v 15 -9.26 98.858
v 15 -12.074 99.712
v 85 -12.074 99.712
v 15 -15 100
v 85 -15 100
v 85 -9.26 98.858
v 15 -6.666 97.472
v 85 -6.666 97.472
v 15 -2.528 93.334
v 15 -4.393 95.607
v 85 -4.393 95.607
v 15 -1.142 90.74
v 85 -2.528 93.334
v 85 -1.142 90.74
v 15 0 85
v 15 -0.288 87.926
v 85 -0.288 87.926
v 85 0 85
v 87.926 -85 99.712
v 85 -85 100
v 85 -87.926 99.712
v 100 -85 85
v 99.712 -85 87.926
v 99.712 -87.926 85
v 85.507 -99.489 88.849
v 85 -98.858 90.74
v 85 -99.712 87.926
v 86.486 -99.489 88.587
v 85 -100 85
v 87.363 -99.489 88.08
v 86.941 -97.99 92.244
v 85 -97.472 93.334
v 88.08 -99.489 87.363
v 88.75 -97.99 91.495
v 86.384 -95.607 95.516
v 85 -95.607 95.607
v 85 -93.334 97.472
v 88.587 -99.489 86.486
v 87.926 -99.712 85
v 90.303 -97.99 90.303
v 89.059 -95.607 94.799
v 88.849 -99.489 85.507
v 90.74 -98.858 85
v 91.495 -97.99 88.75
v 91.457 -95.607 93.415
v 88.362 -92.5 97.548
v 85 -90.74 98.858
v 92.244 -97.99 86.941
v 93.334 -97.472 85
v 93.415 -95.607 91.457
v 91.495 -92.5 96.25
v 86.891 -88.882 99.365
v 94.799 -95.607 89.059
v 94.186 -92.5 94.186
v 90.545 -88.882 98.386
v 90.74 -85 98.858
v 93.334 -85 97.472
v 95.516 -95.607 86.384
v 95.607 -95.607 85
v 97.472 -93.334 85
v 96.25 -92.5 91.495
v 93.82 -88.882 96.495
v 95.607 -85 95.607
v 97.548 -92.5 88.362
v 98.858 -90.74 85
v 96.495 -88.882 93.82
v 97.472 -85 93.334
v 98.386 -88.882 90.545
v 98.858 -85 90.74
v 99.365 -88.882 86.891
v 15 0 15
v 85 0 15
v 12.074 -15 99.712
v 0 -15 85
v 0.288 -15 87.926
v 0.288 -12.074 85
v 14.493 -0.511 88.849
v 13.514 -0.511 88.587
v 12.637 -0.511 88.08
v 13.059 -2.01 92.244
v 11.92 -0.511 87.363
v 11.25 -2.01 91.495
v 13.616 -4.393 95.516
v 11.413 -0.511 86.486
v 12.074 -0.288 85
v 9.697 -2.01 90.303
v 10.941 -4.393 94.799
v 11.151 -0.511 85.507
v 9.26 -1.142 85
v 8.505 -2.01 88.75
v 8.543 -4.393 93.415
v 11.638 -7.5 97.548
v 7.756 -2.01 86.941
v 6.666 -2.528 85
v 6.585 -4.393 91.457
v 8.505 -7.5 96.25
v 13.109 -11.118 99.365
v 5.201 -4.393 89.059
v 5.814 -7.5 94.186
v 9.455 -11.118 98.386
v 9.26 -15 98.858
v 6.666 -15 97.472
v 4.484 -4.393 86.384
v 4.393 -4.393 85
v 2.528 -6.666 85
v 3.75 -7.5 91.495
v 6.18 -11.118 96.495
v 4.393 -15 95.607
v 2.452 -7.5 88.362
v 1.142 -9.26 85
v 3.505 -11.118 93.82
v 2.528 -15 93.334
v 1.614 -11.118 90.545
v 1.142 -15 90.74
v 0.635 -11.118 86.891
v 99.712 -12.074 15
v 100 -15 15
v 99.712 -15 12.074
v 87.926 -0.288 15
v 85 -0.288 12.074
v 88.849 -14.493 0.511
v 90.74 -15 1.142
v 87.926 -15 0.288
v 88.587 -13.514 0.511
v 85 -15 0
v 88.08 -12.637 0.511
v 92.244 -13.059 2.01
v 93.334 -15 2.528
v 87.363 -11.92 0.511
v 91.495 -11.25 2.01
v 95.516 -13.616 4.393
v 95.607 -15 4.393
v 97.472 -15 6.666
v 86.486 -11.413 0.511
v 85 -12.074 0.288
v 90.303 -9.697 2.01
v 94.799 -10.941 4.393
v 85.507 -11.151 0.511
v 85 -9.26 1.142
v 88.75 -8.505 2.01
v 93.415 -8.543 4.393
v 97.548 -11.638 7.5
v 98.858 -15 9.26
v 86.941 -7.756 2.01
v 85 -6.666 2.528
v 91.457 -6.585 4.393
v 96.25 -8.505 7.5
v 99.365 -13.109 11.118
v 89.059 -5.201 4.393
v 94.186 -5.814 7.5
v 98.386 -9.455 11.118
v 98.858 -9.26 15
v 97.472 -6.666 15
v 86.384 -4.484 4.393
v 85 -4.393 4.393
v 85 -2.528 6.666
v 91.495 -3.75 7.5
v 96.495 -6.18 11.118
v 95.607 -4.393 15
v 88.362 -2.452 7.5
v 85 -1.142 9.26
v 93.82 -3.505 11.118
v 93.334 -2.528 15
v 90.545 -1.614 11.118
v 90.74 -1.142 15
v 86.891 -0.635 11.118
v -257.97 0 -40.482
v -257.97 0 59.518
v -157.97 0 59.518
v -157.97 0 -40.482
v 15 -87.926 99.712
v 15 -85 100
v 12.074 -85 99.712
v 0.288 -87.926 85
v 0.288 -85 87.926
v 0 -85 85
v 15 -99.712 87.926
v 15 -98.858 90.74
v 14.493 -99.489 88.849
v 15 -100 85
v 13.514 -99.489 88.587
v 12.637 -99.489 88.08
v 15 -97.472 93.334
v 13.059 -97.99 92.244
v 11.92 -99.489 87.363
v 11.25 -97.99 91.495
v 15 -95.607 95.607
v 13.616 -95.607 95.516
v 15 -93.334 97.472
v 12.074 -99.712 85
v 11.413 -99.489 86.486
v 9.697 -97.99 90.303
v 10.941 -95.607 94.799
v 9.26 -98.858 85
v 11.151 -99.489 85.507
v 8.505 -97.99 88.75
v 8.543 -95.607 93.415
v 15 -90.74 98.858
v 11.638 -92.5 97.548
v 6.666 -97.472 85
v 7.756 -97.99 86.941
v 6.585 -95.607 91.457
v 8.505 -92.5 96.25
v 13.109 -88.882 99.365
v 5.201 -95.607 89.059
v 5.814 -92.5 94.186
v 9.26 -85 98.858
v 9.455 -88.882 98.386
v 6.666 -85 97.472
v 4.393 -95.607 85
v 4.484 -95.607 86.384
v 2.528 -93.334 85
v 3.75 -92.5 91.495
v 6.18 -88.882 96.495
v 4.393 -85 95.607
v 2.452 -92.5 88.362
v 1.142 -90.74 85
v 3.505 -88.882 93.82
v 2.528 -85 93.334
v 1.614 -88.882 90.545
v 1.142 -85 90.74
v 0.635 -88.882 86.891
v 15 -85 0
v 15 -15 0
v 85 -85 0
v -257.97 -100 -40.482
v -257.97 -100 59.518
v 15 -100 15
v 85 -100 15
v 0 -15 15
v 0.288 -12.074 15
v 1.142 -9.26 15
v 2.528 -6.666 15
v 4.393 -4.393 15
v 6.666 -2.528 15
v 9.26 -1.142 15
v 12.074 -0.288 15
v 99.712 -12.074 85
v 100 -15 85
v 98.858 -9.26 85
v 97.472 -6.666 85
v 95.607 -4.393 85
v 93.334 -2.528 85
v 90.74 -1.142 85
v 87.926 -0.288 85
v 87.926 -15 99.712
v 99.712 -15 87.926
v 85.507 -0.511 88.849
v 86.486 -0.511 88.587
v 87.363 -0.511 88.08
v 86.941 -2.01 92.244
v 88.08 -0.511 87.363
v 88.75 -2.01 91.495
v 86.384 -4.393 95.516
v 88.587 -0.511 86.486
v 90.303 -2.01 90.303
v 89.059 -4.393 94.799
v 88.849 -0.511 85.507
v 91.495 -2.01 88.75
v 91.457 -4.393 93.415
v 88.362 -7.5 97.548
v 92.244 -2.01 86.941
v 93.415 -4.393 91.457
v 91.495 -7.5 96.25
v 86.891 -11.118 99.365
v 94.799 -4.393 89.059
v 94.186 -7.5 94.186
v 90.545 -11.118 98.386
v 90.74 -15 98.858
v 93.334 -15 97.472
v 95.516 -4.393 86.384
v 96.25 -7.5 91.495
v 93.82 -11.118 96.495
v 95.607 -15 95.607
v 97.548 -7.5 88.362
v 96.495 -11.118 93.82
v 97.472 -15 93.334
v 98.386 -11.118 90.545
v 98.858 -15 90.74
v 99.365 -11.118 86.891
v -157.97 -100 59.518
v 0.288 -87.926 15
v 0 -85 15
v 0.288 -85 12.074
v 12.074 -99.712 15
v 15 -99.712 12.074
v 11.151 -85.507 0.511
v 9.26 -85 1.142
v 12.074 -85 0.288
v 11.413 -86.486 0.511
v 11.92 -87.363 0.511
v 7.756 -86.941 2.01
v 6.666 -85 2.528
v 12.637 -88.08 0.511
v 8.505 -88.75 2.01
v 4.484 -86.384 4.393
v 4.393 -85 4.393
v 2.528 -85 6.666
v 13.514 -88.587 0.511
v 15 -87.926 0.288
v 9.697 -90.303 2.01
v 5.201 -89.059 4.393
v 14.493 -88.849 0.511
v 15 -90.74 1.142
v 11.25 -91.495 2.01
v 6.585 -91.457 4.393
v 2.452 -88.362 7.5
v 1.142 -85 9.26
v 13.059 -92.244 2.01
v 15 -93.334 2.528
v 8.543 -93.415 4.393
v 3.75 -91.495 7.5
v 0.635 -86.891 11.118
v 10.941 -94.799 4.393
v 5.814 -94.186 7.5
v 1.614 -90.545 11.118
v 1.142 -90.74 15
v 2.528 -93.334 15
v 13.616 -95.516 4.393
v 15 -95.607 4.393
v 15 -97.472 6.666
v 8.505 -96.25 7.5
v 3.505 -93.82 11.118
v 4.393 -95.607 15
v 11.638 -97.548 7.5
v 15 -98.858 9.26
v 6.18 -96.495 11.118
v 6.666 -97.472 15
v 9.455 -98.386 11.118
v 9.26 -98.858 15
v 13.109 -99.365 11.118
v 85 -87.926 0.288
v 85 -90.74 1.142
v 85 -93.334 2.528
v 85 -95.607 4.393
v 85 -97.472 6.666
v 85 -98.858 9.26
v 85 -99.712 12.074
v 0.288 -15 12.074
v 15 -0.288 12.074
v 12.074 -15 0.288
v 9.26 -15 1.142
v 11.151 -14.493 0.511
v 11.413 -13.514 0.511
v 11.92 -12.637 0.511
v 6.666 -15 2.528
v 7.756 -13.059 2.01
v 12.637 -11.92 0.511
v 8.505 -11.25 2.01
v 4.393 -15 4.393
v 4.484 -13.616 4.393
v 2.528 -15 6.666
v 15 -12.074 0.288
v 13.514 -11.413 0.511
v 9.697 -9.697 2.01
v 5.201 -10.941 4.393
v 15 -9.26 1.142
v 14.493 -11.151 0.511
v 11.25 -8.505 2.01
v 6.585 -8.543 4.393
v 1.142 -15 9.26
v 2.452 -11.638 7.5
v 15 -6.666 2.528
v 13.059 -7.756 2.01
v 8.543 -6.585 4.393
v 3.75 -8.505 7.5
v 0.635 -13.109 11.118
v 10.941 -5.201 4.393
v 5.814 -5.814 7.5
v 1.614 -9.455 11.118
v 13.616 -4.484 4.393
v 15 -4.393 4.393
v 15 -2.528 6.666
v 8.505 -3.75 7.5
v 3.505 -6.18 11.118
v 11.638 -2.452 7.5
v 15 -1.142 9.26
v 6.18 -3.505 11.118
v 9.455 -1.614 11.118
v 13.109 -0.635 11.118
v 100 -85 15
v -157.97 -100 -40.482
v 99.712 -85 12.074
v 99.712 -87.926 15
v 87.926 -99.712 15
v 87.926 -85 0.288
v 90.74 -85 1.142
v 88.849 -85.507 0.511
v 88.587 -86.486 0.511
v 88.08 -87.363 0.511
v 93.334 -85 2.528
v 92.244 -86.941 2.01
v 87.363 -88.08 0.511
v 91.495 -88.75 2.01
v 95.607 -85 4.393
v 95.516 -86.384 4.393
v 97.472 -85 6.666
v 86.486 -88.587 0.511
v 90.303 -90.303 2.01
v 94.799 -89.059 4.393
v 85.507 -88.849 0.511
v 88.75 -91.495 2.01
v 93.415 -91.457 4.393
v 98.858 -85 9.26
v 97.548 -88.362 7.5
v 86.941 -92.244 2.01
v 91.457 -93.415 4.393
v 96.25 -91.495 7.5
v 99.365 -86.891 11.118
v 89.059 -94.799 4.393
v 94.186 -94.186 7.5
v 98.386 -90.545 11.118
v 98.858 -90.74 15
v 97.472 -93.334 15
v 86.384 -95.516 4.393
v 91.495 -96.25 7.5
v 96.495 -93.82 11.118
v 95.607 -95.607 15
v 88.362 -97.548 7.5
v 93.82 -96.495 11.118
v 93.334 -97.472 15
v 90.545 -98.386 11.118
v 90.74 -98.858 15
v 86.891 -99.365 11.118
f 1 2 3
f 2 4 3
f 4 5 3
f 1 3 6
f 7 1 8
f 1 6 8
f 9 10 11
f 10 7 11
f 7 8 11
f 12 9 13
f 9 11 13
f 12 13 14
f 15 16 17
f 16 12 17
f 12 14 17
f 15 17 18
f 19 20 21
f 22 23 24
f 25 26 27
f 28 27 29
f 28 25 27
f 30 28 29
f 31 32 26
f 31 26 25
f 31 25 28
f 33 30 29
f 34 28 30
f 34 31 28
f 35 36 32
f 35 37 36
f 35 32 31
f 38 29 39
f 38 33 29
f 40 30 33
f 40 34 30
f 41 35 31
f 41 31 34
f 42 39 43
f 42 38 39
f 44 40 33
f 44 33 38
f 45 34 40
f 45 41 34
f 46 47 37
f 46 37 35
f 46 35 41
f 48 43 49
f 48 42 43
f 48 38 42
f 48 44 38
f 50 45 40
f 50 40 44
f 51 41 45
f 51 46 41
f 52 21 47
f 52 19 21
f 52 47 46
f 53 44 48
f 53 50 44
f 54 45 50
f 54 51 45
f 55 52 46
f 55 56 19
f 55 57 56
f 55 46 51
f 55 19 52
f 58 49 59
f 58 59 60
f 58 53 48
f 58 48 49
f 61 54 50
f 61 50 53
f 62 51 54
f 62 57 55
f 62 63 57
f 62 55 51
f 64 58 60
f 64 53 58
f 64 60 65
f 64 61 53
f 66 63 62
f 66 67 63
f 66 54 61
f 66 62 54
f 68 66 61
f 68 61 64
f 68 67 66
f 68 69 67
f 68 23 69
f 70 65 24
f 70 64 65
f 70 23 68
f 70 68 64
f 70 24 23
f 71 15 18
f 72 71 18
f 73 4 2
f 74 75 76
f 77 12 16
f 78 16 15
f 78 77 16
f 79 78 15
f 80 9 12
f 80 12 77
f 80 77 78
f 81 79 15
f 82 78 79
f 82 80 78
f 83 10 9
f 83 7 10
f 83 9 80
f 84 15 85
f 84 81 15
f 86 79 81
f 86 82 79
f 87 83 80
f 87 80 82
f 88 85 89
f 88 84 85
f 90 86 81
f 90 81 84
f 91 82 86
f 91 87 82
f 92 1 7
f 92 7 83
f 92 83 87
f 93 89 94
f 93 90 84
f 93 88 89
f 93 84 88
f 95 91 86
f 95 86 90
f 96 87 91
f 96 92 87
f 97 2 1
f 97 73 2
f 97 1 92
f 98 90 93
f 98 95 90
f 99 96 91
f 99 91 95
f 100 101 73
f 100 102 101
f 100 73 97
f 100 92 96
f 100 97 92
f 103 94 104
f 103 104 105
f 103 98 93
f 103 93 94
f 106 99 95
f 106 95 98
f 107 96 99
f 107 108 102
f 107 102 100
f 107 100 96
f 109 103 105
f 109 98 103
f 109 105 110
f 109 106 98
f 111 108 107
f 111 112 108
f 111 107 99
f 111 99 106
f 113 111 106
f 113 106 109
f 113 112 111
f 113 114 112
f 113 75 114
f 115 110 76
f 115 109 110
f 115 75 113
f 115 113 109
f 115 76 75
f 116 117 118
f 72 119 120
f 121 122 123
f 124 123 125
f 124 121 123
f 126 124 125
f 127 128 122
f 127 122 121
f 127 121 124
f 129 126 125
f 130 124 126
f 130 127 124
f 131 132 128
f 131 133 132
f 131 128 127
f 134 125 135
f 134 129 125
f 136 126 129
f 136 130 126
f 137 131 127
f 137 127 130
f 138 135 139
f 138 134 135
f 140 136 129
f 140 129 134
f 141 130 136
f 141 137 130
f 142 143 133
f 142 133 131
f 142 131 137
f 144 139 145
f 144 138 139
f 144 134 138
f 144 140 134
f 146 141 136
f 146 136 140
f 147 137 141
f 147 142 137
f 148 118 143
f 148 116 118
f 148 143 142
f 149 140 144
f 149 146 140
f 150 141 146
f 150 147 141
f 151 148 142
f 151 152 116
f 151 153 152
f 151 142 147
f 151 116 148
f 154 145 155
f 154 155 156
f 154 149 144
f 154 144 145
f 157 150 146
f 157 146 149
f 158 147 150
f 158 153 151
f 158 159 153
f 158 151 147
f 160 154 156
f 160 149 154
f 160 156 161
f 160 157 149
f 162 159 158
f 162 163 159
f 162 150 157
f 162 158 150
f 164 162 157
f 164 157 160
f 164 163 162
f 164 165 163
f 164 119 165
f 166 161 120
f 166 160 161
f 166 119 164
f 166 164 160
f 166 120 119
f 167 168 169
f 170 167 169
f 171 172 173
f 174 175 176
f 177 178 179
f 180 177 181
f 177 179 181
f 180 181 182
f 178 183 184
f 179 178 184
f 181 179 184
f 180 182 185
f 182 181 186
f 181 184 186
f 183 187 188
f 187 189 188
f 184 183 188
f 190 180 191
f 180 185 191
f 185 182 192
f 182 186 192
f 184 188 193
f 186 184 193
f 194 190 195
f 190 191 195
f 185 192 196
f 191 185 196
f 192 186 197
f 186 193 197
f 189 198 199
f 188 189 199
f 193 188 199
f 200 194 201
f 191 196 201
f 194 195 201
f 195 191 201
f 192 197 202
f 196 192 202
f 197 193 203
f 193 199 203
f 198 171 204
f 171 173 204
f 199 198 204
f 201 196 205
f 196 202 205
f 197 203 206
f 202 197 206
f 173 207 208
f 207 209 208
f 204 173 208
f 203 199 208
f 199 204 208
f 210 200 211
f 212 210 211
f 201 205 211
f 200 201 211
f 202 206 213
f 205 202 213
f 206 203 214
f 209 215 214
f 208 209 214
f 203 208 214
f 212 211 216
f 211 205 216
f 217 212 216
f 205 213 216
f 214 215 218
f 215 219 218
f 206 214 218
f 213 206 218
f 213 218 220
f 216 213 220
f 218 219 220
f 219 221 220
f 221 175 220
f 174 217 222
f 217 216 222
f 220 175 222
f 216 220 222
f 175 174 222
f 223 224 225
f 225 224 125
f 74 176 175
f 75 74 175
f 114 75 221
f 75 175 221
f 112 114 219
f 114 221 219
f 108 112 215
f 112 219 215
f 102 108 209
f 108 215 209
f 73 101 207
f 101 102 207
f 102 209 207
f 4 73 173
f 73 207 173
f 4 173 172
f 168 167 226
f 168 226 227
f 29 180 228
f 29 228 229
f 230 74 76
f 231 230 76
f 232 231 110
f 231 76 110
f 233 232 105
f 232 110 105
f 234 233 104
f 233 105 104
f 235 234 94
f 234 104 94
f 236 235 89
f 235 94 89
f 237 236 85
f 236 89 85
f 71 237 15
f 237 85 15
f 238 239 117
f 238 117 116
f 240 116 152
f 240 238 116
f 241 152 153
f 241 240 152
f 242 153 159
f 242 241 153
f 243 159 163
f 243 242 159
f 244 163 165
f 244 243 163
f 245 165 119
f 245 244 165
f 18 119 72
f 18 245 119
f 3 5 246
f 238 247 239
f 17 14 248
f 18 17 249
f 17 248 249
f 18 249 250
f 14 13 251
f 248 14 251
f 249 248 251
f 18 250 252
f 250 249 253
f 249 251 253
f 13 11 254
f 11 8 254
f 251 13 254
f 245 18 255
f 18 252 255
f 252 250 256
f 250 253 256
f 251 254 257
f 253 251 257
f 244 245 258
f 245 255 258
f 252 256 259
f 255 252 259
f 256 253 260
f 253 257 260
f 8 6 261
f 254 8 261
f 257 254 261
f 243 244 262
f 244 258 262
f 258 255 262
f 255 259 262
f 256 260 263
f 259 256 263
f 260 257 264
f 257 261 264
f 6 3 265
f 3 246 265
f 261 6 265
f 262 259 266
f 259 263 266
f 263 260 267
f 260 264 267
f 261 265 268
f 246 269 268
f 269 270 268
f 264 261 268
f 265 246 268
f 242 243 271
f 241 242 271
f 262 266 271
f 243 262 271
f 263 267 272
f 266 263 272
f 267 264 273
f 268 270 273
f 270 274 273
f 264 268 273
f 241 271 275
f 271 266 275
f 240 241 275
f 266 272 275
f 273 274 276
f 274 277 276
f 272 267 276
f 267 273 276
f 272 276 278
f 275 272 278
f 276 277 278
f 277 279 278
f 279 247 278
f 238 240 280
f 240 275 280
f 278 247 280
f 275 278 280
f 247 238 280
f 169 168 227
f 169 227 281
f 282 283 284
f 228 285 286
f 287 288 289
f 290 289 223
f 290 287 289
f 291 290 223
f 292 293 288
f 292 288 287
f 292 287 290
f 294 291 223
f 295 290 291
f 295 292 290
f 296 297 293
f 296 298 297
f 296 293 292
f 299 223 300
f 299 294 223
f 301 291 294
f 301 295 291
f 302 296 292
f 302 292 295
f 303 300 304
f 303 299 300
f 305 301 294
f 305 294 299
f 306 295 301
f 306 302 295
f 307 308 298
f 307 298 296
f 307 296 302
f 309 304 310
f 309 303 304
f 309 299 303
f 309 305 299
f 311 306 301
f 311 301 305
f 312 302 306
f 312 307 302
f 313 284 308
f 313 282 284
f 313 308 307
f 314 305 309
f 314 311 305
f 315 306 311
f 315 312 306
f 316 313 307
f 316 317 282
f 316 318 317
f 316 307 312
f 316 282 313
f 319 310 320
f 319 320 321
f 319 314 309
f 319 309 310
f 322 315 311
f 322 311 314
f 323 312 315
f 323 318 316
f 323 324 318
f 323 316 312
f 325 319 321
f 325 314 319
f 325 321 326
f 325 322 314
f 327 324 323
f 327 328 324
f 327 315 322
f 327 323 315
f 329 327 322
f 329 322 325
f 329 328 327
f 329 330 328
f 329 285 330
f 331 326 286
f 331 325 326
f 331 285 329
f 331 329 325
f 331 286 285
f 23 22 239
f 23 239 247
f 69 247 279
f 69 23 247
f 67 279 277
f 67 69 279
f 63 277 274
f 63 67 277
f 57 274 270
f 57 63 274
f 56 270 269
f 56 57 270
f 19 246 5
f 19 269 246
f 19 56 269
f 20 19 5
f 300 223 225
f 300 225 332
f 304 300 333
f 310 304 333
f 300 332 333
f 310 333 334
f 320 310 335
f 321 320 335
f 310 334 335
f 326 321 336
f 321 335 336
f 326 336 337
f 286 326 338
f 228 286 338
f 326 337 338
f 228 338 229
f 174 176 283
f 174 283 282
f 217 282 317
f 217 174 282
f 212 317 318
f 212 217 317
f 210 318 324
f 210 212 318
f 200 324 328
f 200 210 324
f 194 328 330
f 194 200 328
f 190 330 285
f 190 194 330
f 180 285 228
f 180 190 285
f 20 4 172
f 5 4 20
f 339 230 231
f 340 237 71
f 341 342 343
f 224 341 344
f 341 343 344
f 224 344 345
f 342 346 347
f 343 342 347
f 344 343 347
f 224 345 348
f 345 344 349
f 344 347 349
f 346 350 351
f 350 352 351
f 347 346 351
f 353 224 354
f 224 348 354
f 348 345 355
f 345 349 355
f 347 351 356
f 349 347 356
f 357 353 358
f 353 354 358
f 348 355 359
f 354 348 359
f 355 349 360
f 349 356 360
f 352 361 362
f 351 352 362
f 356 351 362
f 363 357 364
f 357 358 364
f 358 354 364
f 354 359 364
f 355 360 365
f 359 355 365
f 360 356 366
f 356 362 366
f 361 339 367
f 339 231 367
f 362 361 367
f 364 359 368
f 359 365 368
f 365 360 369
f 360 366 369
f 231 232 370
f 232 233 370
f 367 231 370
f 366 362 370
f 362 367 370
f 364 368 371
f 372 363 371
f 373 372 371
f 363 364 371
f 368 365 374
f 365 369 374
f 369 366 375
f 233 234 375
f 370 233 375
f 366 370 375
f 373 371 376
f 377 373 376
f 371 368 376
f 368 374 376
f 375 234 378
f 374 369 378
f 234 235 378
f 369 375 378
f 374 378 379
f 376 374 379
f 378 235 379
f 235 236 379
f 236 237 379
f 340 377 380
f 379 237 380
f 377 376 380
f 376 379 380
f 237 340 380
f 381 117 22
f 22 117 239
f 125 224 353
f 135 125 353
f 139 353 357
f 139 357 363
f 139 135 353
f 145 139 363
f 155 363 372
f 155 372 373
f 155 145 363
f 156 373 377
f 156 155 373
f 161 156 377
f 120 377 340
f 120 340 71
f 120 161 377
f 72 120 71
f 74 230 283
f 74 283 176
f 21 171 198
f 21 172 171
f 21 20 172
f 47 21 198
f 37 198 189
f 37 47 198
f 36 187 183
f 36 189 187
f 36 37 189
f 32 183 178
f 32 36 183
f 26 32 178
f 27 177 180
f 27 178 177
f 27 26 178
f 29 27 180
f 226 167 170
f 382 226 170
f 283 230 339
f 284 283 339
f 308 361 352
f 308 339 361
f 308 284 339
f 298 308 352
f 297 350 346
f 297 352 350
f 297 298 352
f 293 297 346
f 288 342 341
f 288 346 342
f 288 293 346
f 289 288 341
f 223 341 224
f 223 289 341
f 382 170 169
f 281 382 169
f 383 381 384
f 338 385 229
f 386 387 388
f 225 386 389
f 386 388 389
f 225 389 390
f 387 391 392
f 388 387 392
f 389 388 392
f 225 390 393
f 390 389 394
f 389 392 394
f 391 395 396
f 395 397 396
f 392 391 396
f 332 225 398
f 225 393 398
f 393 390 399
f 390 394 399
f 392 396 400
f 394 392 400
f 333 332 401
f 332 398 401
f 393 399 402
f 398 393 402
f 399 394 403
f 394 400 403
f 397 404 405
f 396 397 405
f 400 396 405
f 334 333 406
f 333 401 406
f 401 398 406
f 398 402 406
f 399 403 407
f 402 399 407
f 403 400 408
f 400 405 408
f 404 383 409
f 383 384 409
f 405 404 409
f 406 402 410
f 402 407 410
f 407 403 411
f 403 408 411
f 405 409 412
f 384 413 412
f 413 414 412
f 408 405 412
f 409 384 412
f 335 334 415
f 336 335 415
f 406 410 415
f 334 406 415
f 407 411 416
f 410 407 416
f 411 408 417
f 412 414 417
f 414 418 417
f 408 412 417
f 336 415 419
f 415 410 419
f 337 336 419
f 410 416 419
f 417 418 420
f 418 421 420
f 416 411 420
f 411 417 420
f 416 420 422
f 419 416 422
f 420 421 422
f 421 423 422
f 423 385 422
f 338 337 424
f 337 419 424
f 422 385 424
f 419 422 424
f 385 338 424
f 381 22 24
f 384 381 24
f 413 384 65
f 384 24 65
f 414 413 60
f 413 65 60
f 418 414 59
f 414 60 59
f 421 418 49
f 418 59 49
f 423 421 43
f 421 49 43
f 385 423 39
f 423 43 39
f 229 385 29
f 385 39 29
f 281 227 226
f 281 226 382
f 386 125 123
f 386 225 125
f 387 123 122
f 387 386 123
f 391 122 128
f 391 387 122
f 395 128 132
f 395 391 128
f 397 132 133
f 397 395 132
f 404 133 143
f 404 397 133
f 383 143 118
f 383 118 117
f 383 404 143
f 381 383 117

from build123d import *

# Parameters (mm, degrees)
F0_W     = 100
F0_H     = 100
F1_DEPTH = 100
F2_R     = 15
F3_W     = 100
F3_H     = 100
F4_DEPTH = 100


with BuildPart() as f1:
    # F0 (on Front) → F1 (new body)
    with BuildSketch(Plane.XZ):
        with Locations((50, 50)):
            Rectangle(F0_W, F0_H)
    extrude(amount=F1_DEPTH)

    # F2
    f2_edges = [f1.edges().sort_by_distance(p)[0] for p in [
        (100, -50, 100),
        (0, -50, 100),
        (50, 0, 100),
        (50, -100, 100),
        (100, -100, 50),
        (100, 0, 50),
        (0, -100, 50),
        (0, 0, 50),
        (0, -50, 0),
        (100, -50, 0),
        (50, 0, 0),
        (50, -100, 0),
    ]]
    fillet(f2_edges, radius=F2_R)


with BuildPart() as f4:
    # F3 (on Front) → F4 (new body)
    with BuildSketch(Plane.XZ):
        with Locations((-207.970214, 9.518399)):
            Rectangle(F3_W, F3_H)
    extrude(amount=F4_DEPTH)


solid = Compound([f1.part, f4.part])
